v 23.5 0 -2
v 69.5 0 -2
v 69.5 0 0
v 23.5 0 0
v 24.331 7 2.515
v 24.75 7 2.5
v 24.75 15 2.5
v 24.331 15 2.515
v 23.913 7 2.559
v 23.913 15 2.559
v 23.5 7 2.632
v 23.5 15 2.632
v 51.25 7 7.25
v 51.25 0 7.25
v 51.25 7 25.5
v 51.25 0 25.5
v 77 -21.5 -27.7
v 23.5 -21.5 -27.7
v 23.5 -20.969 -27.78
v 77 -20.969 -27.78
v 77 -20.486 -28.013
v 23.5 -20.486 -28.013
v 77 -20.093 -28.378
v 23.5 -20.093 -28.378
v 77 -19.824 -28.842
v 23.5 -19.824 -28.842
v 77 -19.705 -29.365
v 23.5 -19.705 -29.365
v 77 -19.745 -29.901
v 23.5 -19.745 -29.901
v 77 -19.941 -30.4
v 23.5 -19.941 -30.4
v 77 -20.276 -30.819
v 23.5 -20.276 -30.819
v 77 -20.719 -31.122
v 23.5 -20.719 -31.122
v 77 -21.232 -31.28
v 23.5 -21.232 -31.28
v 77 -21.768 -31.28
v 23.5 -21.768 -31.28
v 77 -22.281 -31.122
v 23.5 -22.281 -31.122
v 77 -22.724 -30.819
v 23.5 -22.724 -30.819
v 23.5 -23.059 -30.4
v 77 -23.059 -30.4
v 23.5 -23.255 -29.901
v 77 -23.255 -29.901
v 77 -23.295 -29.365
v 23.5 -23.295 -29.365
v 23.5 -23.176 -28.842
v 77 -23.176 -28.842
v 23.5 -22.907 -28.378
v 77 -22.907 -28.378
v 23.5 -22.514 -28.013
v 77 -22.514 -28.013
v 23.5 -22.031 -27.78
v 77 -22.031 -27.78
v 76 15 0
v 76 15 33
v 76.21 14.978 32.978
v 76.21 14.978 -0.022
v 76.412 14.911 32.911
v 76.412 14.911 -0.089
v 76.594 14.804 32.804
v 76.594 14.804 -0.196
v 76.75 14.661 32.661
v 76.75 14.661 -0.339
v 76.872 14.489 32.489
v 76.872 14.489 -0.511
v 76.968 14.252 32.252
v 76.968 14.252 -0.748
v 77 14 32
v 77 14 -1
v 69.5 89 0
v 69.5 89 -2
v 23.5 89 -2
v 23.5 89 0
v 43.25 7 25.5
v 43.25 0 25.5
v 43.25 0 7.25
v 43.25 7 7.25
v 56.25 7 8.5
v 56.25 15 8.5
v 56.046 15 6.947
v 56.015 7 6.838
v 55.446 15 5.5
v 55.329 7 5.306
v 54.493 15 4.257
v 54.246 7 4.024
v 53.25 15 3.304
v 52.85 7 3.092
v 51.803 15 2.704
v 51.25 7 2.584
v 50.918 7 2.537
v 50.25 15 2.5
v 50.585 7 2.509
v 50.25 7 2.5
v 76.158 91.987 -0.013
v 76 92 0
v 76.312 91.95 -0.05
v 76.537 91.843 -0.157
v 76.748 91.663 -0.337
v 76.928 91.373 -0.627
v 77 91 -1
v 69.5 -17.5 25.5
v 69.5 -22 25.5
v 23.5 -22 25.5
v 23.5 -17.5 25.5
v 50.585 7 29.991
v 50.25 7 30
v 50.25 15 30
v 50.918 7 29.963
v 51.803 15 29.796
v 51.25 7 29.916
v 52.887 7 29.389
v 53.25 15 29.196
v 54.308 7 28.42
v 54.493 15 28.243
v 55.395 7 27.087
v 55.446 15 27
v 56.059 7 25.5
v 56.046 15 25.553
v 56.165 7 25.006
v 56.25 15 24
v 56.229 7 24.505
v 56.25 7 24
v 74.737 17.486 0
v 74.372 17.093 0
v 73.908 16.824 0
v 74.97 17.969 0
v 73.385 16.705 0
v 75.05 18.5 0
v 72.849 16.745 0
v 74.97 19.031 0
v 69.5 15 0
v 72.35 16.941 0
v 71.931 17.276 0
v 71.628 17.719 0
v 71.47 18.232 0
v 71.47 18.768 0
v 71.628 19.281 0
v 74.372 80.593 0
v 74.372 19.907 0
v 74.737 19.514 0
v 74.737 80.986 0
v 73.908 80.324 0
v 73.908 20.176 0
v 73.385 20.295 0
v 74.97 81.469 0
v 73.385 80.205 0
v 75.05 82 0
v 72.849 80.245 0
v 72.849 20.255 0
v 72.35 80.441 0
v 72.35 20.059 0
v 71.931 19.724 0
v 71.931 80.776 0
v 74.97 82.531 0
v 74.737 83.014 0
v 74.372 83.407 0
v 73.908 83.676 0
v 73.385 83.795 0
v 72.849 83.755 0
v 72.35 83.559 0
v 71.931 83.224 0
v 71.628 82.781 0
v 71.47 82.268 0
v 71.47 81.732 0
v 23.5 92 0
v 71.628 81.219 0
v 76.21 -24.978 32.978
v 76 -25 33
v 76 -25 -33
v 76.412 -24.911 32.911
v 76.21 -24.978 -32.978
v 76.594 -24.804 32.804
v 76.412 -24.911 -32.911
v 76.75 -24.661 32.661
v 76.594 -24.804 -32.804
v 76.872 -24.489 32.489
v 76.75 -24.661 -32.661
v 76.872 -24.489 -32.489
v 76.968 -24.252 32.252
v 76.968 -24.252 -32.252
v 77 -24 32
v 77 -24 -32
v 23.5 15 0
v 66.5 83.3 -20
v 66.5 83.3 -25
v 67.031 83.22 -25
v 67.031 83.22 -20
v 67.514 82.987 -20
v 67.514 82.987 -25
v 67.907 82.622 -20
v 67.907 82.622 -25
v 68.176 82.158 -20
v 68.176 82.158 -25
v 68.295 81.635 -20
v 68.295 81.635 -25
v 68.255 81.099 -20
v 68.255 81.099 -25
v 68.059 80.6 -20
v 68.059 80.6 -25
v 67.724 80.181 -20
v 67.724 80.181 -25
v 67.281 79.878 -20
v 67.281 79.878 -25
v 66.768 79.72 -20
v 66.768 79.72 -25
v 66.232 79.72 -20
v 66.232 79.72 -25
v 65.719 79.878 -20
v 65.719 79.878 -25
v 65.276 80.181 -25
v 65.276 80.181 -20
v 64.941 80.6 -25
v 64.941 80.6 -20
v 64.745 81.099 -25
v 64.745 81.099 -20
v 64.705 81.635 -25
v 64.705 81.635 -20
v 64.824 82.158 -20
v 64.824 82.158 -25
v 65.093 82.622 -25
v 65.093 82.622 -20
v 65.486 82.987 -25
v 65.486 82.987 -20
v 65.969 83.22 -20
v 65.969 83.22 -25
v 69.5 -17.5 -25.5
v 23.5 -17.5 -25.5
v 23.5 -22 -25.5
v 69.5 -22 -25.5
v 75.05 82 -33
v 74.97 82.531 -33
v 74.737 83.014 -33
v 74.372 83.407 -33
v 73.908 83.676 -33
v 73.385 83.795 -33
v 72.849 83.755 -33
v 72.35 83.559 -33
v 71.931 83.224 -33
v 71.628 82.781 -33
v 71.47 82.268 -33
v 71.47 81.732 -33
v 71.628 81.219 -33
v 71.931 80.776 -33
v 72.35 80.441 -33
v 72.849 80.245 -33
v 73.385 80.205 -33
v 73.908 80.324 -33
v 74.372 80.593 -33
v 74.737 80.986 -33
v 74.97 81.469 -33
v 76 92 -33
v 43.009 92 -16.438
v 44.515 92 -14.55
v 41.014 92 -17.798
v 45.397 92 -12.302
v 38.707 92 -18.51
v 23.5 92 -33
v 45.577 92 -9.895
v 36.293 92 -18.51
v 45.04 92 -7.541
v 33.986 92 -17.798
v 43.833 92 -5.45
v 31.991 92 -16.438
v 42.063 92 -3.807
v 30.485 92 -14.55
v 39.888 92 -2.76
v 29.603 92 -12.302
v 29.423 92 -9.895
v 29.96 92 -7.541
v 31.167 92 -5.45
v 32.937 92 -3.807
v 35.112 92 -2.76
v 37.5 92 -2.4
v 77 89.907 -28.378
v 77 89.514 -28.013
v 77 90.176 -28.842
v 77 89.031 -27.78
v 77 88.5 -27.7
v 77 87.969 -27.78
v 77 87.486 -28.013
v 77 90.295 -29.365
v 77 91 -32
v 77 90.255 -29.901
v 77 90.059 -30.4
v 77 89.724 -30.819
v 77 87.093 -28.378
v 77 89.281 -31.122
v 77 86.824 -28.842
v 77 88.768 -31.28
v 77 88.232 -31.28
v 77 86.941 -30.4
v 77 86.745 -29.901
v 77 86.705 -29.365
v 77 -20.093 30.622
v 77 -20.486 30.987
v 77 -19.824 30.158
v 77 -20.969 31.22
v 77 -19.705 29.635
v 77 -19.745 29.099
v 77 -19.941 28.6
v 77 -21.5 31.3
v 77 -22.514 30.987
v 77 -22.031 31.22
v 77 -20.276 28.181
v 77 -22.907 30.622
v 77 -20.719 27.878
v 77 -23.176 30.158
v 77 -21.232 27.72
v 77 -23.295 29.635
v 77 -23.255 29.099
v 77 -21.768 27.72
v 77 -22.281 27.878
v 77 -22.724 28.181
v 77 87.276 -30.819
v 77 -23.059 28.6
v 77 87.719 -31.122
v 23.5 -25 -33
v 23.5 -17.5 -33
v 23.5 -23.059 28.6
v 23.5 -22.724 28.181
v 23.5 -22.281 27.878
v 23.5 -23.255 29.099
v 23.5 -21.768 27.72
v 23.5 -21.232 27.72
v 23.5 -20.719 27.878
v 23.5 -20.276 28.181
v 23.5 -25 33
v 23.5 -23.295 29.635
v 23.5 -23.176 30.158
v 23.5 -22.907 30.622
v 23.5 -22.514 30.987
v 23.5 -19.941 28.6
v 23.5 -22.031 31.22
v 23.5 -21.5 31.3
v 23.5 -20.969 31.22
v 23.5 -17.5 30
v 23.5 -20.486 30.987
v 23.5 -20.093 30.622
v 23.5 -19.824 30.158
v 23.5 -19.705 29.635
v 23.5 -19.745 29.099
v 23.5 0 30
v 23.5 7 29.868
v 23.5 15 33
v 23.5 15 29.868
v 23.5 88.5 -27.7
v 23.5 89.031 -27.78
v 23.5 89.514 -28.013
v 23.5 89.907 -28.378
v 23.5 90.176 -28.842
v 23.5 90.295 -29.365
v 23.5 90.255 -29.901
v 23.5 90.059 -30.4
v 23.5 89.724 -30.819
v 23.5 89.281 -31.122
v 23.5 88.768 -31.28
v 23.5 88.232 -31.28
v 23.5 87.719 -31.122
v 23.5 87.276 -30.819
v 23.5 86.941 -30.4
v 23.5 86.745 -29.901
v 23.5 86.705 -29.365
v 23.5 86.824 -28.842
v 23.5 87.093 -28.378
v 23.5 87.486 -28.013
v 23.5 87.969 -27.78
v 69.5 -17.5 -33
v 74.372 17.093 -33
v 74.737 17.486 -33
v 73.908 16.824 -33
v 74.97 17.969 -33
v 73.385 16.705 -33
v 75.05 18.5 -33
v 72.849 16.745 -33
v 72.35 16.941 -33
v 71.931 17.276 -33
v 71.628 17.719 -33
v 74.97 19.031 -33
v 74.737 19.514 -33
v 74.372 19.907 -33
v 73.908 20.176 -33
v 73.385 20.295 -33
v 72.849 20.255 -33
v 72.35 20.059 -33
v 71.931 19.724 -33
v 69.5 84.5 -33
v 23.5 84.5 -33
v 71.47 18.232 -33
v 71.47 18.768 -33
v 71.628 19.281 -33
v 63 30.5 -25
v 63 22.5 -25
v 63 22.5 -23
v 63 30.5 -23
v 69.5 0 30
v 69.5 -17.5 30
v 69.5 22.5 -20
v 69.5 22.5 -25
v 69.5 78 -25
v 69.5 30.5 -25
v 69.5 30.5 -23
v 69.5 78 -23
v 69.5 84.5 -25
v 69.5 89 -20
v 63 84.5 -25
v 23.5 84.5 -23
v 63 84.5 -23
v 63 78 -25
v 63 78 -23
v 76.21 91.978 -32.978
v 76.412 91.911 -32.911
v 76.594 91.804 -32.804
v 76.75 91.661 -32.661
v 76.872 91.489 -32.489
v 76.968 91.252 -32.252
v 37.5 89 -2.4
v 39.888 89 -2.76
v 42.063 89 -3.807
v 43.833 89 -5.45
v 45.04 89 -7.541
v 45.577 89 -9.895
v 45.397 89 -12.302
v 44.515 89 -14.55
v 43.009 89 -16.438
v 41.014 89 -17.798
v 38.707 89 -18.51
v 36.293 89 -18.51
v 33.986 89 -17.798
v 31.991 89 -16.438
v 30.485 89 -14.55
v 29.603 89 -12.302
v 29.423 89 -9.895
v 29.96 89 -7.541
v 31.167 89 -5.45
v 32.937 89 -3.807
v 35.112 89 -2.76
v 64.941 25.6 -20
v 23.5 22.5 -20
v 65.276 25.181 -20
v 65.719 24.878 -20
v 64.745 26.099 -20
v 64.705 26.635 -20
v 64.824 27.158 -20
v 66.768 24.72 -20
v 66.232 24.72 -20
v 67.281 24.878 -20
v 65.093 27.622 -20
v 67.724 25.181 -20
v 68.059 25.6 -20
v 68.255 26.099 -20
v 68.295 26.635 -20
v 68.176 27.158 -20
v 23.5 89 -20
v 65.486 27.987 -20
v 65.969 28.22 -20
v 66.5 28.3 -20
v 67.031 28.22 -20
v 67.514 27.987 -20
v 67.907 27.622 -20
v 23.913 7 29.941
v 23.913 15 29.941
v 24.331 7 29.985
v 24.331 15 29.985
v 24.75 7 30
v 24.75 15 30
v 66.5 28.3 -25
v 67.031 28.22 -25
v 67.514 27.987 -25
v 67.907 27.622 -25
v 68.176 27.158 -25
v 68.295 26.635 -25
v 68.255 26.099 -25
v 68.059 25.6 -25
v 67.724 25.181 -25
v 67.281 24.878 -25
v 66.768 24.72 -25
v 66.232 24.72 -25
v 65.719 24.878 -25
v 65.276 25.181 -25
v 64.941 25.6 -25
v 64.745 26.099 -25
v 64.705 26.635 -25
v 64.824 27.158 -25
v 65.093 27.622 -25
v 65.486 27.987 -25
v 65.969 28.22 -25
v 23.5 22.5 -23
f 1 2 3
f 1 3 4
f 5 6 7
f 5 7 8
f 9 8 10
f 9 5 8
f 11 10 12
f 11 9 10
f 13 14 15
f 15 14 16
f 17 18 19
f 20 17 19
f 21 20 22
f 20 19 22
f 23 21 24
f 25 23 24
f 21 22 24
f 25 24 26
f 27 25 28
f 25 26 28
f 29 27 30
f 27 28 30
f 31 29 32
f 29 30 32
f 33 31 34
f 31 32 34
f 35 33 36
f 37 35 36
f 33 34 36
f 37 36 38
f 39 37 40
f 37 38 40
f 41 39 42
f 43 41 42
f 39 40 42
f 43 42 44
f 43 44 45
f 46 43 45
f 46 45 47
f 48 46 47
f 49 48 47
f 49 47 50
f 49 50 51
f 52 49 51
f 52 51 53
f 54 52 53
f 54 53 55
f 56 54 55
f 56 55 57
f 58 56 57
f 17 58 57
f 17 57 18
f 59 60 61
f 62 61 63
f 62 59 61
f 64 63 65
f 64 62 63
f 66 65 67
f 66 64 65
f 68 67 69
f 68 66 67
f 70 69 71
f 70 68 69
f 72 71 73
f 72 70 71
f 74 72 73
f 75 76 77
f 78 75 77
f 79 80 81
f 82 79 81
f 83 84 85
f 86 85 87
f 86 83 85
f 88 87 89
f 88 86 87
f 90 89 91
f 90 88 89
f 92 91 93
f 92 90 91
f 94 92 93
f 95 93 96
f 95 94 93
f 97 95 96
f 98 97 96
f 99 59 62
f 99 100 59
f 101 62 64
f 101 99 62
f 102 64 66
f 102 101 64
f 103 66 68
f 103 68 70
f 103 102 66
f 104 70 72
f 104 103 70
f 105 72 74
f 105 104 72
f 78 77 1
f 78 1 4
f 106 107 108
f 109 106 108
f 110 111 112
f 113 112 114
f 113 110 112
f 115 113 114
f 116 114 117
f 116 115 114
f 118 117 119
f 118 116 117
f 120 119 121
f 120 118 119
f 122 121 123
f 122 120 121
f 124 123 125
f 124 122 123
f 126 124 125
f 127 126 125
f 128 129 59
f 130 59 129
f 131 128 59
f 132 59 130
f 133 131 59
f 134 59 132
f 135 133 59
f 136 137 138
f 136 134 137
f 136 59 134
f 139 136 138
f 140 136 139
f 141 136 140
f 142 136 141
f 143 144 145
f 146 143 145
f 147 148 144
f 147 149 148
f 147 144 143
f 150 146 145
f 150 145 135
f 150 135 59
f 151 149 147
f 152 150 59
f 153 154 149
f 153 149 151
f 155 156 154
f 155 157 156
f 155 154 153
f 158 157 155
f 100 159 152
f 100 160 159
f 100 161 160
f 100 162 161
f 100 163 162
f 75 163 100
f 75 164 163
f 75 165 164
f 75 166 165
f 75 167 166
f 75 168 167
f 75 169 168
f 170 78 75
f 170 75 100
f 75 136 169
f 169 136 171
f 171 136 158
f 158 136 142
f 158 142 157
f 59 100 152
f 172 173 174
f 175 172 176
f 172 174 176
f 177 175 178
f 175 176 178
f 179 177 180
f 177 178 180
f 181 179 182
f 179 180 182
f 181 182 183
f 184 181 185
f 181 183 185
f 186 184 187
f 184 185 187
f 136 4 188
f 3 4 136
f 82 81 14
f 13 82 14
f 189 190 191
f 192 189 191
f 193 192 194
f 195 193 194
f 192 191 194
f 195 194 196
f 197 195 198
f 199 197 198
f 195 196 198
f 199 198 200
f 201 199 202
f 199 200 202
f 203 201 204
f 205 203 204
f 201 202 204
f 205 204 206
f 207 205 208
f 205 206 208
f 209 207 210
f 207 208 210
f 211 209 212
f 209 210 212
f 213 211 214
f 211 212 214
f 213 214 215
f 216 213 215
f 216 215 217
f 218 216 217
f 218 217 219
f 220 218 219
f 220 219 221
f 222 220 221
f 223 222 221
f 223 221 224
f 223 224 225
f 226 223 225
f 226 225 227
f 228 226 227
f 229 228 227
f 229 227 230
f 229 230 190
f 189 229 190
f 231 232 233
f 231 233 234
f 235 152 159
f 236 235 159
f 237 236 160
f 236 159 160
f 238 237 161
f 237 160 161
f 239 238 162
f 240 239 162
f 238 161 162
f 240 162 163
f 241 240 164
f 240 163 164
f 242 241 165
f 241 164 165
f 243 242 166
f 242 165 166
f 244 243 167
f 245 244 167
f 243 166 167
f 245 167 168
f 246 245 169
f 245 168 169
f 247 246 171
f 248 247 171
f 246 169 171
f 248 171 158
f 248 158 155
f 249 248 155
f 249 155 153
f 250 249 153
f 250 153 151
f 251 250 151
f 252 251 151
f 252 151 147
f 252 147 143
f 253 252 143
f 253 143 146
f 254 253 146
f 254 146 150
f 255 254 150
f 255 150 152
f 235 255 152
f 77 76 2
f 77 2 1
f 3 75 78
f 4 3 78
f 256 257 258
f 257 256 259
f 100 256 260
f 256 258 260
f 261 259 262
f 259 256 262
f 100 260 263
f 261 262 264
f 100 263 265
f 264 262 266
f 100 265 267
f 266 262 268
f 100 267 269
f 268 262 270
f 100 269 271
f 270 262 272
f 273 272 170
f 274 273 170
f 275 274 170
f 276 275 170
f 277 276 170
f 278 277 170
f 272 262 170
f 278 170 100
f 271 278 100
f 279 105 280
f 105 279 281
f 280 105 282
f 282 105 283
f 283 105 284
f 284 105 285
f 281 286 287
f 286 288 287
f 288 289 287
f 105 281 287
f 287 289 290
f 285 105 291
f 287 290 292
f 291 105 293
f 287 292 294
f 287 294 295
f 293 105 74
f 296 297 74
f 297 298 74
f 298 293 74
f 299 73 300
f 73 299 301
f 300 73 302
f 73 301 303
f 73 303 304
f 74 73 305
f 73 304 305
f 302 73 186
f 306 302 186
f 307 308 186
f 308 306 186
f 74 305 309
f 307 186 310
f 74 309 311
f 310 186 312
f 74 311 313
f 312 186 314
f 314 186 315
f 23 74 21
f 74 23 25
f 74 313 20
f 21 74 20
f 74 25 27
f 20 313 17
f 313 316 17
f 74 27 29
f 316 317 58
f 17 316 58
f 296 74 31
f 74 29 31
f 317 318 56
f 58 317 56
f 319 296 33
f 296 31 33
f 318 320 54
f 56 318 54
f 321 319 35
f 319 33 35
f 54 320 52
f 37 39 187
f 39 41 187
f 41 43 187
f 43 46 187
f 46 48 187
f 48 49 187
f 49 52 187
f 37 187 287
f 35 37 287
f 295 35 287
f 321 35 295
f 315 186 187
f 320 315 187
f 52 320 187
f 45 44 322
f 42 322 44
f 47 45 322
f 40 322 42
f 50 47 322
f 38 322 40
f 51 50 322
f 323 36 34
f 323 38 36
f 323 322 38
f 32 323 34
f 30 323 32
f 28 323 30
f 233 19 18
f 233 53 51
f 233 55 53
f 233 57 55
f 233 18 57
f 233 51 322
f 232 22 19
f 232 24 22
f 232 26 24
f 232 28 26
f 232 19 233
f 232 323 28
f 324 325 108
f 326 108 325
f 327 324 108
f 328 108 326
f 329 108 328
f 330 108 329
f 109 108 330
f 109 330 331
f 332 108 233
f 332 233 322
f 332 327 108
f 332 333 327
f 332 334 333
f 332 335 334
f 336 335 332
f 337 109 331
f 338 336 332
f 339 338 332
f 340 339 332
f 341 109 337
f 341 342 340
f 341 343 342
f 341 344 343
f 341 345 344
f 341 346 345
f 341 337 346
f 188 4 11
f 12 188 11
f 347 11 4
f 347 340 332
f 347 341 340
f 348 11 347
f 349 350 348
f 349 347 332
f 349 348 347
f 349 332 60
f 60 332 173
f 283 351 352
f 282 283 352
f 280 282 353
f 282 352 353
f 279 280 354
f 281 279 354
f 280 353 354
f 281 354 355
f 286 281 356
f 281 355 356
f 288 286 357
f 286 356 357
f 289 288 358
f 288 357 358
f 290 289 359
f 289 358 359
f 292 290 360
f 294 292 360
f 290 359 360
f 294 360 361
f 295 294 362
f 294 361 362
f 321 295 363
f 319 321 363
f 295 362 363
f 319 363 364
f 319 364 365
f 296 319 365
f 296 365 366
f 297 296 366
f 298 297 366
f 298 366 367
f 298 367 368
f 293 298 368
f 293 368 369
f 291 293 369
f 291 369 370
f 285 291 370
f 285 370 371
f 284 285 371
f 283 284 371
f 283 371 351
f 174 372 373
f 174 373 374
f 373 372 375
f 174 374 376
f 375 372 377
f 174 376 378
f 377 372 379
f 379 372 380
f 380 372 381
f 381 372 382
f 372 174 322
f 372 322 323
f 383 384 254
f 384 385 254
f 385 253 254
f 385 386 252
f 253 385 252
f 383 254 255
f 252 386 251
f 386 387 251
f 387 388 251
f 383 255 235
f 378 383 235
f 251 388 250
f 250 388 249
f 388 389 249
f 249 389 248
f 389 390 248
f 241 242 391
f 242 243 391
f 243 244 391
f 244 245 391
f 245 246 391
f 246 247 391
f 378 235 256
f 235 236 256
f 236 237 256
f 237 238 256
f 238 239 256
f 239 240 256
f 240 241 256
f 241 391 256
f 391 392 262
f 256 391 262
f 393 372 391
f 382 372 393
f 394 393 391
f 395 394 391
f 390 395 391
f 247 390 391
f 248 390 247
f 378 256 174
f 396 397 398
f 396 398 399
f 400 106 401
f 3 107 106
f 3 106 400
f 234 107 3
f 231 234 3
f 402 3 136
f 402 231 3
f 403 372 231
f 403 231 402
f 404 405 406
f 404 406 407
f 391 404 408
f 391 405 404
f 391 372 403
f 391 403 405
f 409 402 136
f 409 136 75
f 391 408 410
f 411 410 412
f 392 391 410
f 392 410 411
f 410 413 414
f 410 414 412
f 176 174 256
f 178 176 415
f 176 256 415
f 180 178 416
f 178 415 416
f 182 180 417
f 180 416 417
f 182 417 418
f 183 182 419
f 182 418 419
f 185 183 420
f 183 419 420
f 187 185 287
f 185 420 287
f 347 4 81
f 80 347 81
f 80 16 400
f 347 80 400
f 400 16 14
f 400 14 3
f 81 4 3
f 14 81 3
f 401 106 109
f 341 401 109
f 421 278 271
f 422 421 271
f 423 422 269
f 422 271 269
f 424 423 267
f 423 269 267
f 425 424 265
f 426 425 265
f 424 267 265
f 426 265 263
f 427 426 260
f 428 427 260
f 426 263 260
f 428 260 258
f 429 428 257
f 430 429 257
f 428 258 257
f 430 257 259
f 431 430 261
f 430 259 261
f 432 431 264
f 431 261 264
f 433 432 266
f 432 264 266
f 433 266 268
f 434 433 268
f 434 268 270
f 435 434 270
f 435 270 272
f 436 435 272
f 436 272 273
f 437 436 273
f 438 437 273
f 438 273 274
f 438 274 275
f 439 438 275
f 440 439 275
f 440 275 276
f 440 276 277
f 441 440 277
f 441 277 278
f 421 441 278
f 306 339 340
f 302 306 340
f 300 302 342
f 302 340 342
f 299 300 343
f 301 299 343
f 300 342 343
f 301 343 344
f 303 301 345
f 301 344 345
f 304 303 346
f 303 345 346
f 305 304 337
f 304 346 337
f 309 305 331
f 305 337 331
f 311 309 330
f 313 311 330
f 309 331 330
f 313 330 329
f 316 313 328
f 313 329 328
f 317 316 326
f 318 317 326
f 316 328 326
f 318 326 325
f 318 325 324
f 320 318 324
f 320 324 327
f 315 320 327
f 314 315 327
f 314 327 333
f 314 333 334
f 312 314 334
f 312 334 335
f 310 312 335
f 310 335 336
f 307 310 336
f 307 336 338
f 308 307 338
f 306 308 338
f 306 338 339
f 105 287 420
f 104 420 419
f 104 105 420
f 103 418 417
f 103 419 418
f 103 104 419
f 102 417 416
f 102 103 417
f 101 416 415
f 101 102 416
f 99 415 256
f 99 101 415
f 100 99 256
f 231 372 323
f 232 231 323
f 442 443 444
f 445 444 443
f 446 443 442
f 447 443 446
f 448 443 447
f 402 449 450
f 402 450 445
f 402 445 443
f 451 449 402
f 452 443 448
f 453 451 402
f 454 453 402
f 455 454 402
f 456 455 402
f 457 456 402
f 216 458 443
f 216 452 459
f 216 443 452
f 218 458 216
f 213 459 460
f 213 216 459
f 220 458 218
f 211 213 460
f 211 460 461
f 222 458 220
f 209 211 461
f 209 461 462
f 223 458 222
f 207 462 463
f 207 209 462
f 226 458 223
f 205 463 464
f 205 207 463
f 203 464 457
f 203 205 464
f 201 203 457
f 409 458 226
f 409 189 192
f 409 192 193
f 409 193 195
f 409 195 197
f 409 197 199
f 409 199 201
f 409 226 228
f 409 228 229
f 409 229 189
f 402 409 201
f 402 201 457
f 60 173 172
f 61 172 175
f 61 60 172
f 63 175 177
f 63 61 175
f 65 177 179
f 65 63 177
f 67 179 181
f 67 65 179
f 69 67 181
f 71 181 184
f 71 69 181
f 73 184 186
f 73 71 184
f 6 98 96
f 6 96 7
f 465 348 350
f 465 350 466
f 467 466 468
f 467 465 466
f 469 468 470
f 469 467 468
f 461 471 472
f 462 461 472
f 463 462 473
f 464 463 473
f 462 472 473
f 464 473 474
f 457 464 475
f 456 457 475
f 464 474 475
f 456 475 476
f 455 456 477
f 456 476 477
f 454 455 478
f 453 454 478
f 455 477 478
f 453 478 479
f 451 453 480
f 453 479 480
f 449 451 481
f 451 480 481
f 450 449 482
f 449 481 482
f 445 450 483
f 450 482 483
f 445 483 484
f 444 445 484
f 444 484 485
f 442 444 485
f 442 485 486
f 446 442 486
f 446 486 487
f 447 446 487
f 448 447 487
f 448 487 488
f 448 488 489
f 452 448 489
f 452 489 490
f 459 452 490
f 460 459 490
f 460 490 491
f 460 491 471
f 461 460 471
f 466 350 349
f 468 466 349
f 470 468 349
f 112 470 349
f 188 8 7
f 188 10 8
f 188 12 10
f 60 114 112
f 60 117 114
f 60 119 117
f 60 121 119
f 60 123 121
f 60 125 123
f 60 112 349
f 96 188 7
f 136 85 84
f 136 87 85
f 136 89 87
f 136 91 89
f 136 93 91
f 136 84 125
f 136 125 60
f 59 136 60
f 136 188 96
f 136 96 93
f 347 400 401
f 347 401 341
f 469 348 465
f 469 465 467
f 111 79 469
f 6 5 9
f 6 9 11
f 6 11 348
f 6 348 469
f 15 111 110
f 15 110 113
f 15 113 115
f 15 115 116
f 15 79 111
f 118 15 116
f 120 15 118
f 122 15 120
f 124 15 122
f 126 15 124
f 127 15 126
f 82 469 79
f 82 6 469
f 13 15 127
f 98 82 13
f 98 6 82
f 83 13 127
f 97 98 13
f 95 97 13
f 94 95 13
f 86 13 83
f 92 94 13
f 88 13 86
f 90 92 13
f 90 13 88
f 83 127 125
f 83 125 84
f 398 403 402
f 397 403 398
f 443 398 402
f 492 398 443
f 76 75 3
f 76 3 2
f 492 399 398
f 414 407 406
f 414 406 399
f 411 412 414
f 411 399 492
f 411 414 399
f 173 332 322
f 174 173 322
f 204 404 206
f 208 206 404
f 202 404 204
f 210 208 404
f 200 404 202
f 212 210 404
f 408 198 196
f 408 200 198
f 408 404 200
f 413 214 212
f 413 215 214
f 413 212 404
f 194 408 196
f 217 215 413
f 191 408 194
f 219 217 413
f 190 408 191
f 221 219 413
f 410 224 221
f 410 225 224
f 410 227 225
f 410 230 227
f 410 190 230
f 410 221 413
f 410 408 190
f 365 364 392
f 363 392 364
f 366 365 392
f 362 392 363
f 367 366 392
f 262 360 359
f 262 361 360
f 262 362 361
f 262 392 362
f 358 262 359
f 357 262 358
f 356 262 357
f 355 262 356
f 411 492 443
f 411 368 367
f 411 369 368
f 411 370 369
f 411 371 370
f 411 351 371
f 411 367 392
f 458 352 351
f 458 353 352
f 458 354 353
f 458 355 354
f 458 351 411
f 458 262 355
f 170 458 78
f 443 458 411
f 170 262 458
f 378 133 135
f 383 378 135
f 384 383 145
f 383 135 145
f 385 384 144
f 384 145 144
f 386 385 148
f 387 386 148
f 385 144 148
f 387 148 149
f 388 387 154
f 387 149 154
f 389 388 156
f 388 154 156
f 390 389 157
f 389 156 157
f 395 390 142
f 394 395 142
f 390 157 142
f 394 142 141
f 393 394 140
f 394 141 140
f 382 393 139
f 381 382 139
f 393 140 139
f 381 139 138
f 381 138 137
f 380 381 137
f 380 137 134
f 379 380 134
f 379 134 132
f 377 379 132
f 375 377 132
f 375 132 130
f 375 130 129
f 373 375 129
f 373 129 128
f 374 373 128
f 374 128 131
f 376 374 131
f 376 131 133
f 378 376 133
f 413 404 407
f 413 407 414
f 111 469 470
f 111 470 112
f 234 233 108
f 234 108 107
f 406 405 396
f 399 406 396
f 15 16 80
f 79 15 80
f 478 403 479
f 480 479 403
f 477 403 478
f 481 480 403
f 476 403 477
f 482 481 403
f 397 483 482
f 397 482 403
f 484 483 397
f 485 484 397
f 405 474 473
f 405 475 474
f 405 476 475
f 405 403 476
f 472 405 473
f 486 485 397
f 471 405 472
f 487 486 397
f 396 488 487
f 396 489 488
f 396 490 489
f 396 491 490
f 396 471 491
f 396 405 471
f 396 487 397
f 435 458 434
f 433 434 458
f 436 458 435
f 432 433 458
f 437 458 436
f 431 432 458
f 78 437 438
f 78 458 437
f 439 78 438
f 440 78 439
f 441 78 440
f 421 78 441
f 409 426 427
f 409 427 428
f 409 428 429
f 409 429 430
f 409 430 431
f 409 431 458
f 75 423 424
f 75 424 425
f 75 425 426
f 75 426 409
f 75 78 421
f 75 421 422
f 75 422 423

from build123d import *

# Parameters (mm, degrees)
SKETCH_1_W           = 33
SKETCH_1_H           = 25
SKETCH_1_W_2         = 23
SKETCH_1_H_2         = 117
SKETCH_1_W_3         = 10
EXTRUDE_1_DEPTH      = 77
SKETCH_2_W           = 62
SKETCH_2_H           = 62
CUT_EXTRUDE_1_DEPTH  = 10
SKETCH_3_R           = 8.1
CUT_EXTRUDE_2_DEPTH  = 10
SKETCH_4_W           = 62
SKETCH_4_H           = 40
CUT_EXTRUDE_3_DEPTH  = 58.5
SKETCH_5_W           = 77
SKETCH_5_H           = 33
EXTRUDE_2_DEPTH      = 15
EXTRUDE_3_DEPTH      = 7
SKETCH_7_W           = 62
SKETCH_7_H           = 66.5
CUT_EXTRUDE_4_DEPTH  = 20
SKETCH_8_W           = 62
SKETCH_8_H           = 2
EXTRUDE_4_DEPTH      = 89
SKETCH_9_R           = 1.8
CUT_EXTRUDE_5_DEPTH  = 125.426685241
SKETCH_10_R          = 1.8
CUT_EXTRUDE_6_DEPTH  = 125.426685241
SKETCH_12_R          = 1.8
CUT_EXTRUDE_7_DEPTH  = 3
SKETCH_13_W          = 7.5
SKETCH_13_H          = 11.5
CUT_EXTRUDE_8_DEPTH  = 10
EXTRUDE_START        = 2
SKETCH_14_W          = 6.5
SKETCH_14_H          = 6.5
SKETCH_14_R          = 1.8
SKETCH_14_W_2        = 8
SKETCH_14_H_2        = 8
EXTRUDE_6_DEPTH      = 2
CUT_EXTRUDE_9_DEPTH  = 23.5
SKETCH_17_W          = 46
SKETCH_17_H          = 51
CUT_EXTRUDE_11_DEPTH = 4.5
SKETCH_18_W          = 46
SKETCH_18_H          = 17.5
CUT_EXTRUDE_12_DEPTH = 4.5
FILLET_1_R           = 1


with BuildPart() as part:
    # Sketch 1 → Extrude 1 (new body)
    with BuildSketch(Plane(origin=(0, 0, 0), x_dir=(0, 0, -1), z_dir=(1, 0, 0))):
        with Locations((-16.5, -12.5)):
            Rectangle(SKETCH_1_W, SKETCH_1_H)
        with Locations((11.5, 33.5)):
            Rectangle(SKETCH_1_W_2, SKETCH_1_H_2)
        with Locations((28, 33.5)):
            Rectangle(SKETCH_1_W_3, SKETCH_1_H_2)
    extrude(amount=EXTRUDE_1_DEPTH)

    # Sketch 2 → Cut-Extrude 1 (cut)
    with BuildSketch(Plane(origin=(0, 0, -33), x_dir=(-1, 0, 0), z_dir=(0, 0, -1))):
        with Locations((-38.5, 53.5)):
            Rectangle(SKETCH_2_W, SKETCH_2_H)
    extrude(amount=-CUT_EXTRUDE_1_DEPTH, mode=Mode.SUBTRACT)

    # Sketch 3 → Cut-Extrude 2 (cut)
    with BuildSketch(Plane(origin=(0, 92, 0), x_dir=(1, 0, 0), z_dir=(0, 1, 0))):
        with Locations(Location((37.5, 10.5, 0), (0, 0, 270))):
            Circle(SKETCH_3_R)
    extrude(amount=-CUT_EXTRUDE_2_DEPTH, mode=Mode.SUBTRACT)

    # Sketch 4 → Cut-Extrude 3 (cut)
    with BuildSketch(Plane(origin=(0, 0, -33), x_dir=(-1, 0, 0), z_dir=(0, 0, -1))):
        with Locations((-38.5, 2.5)):
            Rectangle(SKETCH_4_W, SKETCH_4_H)
    extrude(amount=-CUT_EXTRUDE_3_DEPTH, mode=Mode.SUBTRACT)

    # Sketch 5 → Extrude 2 (add)
    with BuildSketch(Plane(origin=(0, 0, 0), x_dir=(1, 0, 0), z_dir=(0, 1, 0))):
        with Locations((38.5, -16.5)):
            Rectangle(SKETCH_5_W, SKETCH_5_H)
        with BuildLine():
            Line((50.25, -2.5), (24.75, -2.5))
            ThreePointArc((24.75, -2.5), (20.507359313, -4.257359313), (18.75, -8.5))
            Line((18.75, -8.5), (18.75, -24))
            ThreePointArc((18.75, -24), (20.507359313, -28.242640687), (24.75, -30))
            Line((24.75, -30), (50.25, -30))
            ThreePointArc((50.25, -30), (54.492640687, -28.242640687), (56.25, -24))
            Line((56.25, -24), (56.25, -8.5))
            ThreePointArc((56.25, -8.5), (54.492640687, -4.257359313), (50.25, -2.5))
        make_face(mode=Mode.SUBTRACT)
    extrude(amount=EXTRUDE_2_DEPTH)

    # Sketch 6 → Extrude 3 (add)
    with BuildSketch(Plane(origin=(0, 0, 0), x_dir=(1, 0, 0), z_dir=(0, 1, 0))):
        with BuildLine():
            Line((43.25, -25.5), (43.25, -25.25))
            Line((43.25, -25.25), (43.25, -7.25))
            Line((43.25, -7.25), (43.25, -2.5))
            Line((43.25, -2.5), (24.75, -2.5))
            ThreePointArc((24.75, -2.5), (20.507359313, -4.257359313), (18.75, -8.5))
            Line((18.75, -8.5), (18.75, -24))
            ThreePointArc((18.75, -24), (18.797821822, -24.756025755), (18.940524981, -25.5))
            Line((18.940524981, -25.5), (43.25, -25.5))
        make_face()
        with BuildLine():
            Line((43.25, -30), (43.25, -25.5))
            Line((43.25, -25.5), (18.940524981, -25.5))
            ThreePointArc((18.940524981, -25.5), (21.075765386, -28.74341649), (24.75, -30))
            Line((24.75, -30), (43.25, -30))
        make_face()
        with BuildLine():
            Line((51.25, -25.5), (43.25, -25.5))
            Line((43.25, -25.5), (43.25, -30))
            Line((43.25, -30), (50.25, -30))
            ThreePointArc((50.25, -30), (50.751757562, -29.978983137), (51.25, -29.916079783))
            Line((51.25, -29.916079783), (51.25, -25.5))
        make_face()
        with BuildLine():
            Line((51.25, -7.25), (51.25, -25.25))
            Line((51.25, -25.25), (51.25, -25.5))
            Line((51.25, -25.5), (56.059475019, -25.5))
            ThreePointArc((56.059475019, -25.5), (56.202178178, -24.756025755), (56.25, -24))
            Line((56.25, -24), (56.25, -8.5))
            ThreePointArc((56.25, -8.5), (54.832575695, -4.627016654), (51.25, -2.583920217))
            Line((51.25, -2.583920217), (51.25, -7.25))
        make_face()
        with BuildLine():
            Line((56.059475019, -25.5), (51.25, -25.5))
            Line((51.25, -25.5), (51.25, -29.916079783))
            ThreePointArc((51.25, -29.916079783), (54.308038648, -28.419538701), (56.059475019, -25.5))
        make_face()
        with BuildLine():
            Line((43.25, -2.5), (43.25, -7.25))
            Line((43.25, -7.25), (51.25, -7.25))
            Line((51.25, -7.25), (51.25, -2.583920217))
            ThreePointArc((51.25, -2.583920217), (50.751757562, -2.521016863), (50.25, -2.5))
            Line((50.25, -2.5), (43.25, -2.5))
        make_face()
    extrude(amount=EXTRUDE_3_DEPTH)

    # Sketch 7 → Cut-Extrude 4 (cut)
    with BuildSketch(Plane.XY):
        with Locations((38.5, 55.75)):
            Rectangle(SKETCH_7_W, SKETCH_7_H)
    extrude(amount=-CUT_EXTRUDE_4_DEPTH, mode=Mode.SUBTRACT)

    # Sketch 9 → Cut-Extrude 5 (cut, through all)
    with BuildSketch(Plane.ZY):
        with Locations((-29.5, 88.5)):
            Circle(SKETCH_9_R)
        with Locations((-29.5, -21.5)):
            Circle(SKETCH_9_R)
        with Locations((29.5, -21.5)):
            Circle(SKETCH_9_R)
    extrude(amount=-CUT_EXTRUDE_5_DEPTH, mode=Mode.SUBTRACT)

    # Sketch 10 → Cut-Extrude 6 (cut, through all)
    with BuildSketch(Plane.XY):
        with Locations((3.75, 82)):
            Circle(SKETCH_10_R)
        with Locations((73.25, 82)):
            Circle(SKETCH_10_R)
        with Locations((73.25, 18.5)):
            Circle(SKETCH_10_R)
        with Locations((3.75, 18.5)):
            Circle(SKETCH_10_R)
    extrude(amount=-CUT_EXTRUDE_6_DEPTH, mode=Mode.SUBTRACT)

    # Sketch 12 → Cut-Extrude 7 (cut)
    with BuildSketch(Plane(origin=(0, 0, -23), x_dir=(-1, 0, 0), z_dir=(0, 0, -1))):
        with Locations(Location((-66.5, 81.5, 0), (0, 0, 90))):
            Circle(SKETCH_12_R)
        with Locations(Location((-11.5, 81.5, 0), (0, 0, 90))):
            Circle(SKETCH_12_R)
        with Locations(Location((-11.5, 26.5, 0), (0, 0, 90))):
            Circle(SKETCH_12_R)
        with Locations(Location((-66.5, 26.5, 0), (0, 0, 90))):
            Circle(SKETCH_12_R)
    extrude(amount=-CUT_EXTRUDE_7_DEPTH, mode=Mode.SUBTRACT)

    # Sketch 13 → Cut-Extrude 8 (cut)
    with BuildSketch(Plane(origin=(0, 0, -33), x_dir=(-1, 0, 0), z_dir=(0, 0, -1))):
        with Locations((-3.75, 36.25)):
            Rectangle(SKETCH_13_W, SKETCH_13_H)
    extrude(amount=-CUT_EXTRUDE_8_DEPTH, mode=Mode.SUBTRACT)

    # Sketch 14 → Extrude 6 (add)
    # profile 1 of 4: a face of its own
    with BuildSketch(Plane(origin=(0, 0, -23), x_dir=(-1, 0, 0), z_dir=(0, 0, -1)).offset(EXTRUDE_START)):
        with Locations((-66.25, 81.25)):
            Rectangle(SKETCH_14_W, SKETCH_14_H)
        with Locations(Location((-66.5, 81.5, 0), (0, 0, 90))):
            Circle(SKETCH_14_R, mode=Mode.SUBTRACT)
    # profile 2 of 4: a face of its own
    with BuildSketch(Plane(origin=(0, 0, -23), x_dir=(-1, 0, 0), z_dir=(0, 0, -1)).offset(EXTRUDE_START)):
        with Locations((-11.5, 81.25)):
            Rectangle(SKETCH_14_W_2, SKETCH_14_H)
        with Locations(Location((-11.5, 81.5, 0), (0, 0, 90))):
            Circle(SKETCH_14_R, mode=Mode.SUBTRACT)
    # profile 3 of 4: a face of its own
    with BuildSketch(Plane(origin=(0, 0, -23), x_dir=(-1, 0, 0), z_dir=(0, 0, -1)).offset(EXTRUDE_START)):
        with Locations((-11.5, 26.5)):
            Rectangle(SKETCH_14_W_2, SKETCH_14_H_2)
        with Locations(Location((-11.5, 26.5, 0), (0, 0, 90))):
            Circle(SKETCH_14_R, mode=Mode.SUBTRACT)
    # profile 4 of 4: a face of its own
    with BuildSketch(Plane(origin=(0, 0, -23), x_dir=(-1, 0, 0), z_dir=(0, 0, -1)).offset(EXTRUDE_START)):
        with Locations((-66.25, 26.5)):
            Rectangle(SKETCH_14_W, SKETCH_14_H_2)
        with Locations(Location((-66.5, 26.5, 0), (0, 0, 90))):
            Circle(SKETCH_14_R, mode=Mode.SUBTRACT)
    extrude(amount=-EXTRUDE_6_DEPTH)


with BuildPart() as body_2:
    # Sketch 8 → Extrude 4 (new body)
    with BuildSketch(Plane(origin=(0, 89, 0), x_dir=(-1, 0, 0), z_dir=(0, -1, 0))):
        with Locations((-38.5, 1)):
            Rectangle(SKETCH_8_W, SKETCH_8_H)
    extrude(amount=EXTRUDE_4_DEPTH)


with BuildPart() as cut_extrude_9_tool:
    # Sketch 15 → Cut-Extrude 9 (new body)
    with BuildSketch(Plane.ZY):
        Polygon((-23, 42), (-23, 30.5), (-33, 30.5), (-33, -25), (33, -25), (33, 15), (0, 15), (0, 92), (-33, 92), (-33, 42), align=None)
    extrude(amount=-CUT_EXTRUDE_9_DEPTH)


with BuildPart() as part_1:
    add(part.part)

    # Cut-Extrude 9: cut by cut_extrude_9_tool
    add(cut_extrude_9_tool.part, mode=Mode.SUBTRACT)

    # Sketch 17 → Cut-Extrude 11 (cut)
    with BuildSketch(Plane(origin=(0, -17.5, 0), x_dir=(1, 0, 0), z_dir=(0, 1, 0))):
        with Locations((46.5, 0)):
            Rectangle(SKETCH_17_W, SKETCH_17_H)
    extrude(amount=-CUT_EXTRUDE_11_DEPTH, mode=Mode.SUBTRACT)

    # Sketch 18 → Cut-Extrude 12 (cut)
    with BuildSketch(Plane(origin=(0, 0, 25.5), x_dir=(-1, 0, 0), z_dir=(0, 0, -1))):
        with Locations((-46.5, -8.75)):
            Rectangle(SKETCH_18_W, SKETCH_18_H)
    extrude(amount=-CUT_EXTRUDE_12_DEPTH, mode=Mode.SUBTRACT)

    # Fillet 1
    fillet_1_edges = [part_1.edges().sort_by_distance(p)[0] for p in [
        (77, -5, 33),
        (77, -25, 0),
        (77, 33.5, -33),
        (77, 92, -16.5),
        (77, 53.5, 0),
        (77, 15, 16.5),
    ]]
    fillet(fillet_1_edges, radius=FILLET_1_R)


with BuildPart() as body_2_1:
    add(body_2.part)

    # Cut-Extrude 9: cut by cut_extrude_9_tool
    add(cut_extrude_9_tool.part, mode=Mode.SUBTRACT)


solid = Compound([part_1.part, body_2_1.part])
